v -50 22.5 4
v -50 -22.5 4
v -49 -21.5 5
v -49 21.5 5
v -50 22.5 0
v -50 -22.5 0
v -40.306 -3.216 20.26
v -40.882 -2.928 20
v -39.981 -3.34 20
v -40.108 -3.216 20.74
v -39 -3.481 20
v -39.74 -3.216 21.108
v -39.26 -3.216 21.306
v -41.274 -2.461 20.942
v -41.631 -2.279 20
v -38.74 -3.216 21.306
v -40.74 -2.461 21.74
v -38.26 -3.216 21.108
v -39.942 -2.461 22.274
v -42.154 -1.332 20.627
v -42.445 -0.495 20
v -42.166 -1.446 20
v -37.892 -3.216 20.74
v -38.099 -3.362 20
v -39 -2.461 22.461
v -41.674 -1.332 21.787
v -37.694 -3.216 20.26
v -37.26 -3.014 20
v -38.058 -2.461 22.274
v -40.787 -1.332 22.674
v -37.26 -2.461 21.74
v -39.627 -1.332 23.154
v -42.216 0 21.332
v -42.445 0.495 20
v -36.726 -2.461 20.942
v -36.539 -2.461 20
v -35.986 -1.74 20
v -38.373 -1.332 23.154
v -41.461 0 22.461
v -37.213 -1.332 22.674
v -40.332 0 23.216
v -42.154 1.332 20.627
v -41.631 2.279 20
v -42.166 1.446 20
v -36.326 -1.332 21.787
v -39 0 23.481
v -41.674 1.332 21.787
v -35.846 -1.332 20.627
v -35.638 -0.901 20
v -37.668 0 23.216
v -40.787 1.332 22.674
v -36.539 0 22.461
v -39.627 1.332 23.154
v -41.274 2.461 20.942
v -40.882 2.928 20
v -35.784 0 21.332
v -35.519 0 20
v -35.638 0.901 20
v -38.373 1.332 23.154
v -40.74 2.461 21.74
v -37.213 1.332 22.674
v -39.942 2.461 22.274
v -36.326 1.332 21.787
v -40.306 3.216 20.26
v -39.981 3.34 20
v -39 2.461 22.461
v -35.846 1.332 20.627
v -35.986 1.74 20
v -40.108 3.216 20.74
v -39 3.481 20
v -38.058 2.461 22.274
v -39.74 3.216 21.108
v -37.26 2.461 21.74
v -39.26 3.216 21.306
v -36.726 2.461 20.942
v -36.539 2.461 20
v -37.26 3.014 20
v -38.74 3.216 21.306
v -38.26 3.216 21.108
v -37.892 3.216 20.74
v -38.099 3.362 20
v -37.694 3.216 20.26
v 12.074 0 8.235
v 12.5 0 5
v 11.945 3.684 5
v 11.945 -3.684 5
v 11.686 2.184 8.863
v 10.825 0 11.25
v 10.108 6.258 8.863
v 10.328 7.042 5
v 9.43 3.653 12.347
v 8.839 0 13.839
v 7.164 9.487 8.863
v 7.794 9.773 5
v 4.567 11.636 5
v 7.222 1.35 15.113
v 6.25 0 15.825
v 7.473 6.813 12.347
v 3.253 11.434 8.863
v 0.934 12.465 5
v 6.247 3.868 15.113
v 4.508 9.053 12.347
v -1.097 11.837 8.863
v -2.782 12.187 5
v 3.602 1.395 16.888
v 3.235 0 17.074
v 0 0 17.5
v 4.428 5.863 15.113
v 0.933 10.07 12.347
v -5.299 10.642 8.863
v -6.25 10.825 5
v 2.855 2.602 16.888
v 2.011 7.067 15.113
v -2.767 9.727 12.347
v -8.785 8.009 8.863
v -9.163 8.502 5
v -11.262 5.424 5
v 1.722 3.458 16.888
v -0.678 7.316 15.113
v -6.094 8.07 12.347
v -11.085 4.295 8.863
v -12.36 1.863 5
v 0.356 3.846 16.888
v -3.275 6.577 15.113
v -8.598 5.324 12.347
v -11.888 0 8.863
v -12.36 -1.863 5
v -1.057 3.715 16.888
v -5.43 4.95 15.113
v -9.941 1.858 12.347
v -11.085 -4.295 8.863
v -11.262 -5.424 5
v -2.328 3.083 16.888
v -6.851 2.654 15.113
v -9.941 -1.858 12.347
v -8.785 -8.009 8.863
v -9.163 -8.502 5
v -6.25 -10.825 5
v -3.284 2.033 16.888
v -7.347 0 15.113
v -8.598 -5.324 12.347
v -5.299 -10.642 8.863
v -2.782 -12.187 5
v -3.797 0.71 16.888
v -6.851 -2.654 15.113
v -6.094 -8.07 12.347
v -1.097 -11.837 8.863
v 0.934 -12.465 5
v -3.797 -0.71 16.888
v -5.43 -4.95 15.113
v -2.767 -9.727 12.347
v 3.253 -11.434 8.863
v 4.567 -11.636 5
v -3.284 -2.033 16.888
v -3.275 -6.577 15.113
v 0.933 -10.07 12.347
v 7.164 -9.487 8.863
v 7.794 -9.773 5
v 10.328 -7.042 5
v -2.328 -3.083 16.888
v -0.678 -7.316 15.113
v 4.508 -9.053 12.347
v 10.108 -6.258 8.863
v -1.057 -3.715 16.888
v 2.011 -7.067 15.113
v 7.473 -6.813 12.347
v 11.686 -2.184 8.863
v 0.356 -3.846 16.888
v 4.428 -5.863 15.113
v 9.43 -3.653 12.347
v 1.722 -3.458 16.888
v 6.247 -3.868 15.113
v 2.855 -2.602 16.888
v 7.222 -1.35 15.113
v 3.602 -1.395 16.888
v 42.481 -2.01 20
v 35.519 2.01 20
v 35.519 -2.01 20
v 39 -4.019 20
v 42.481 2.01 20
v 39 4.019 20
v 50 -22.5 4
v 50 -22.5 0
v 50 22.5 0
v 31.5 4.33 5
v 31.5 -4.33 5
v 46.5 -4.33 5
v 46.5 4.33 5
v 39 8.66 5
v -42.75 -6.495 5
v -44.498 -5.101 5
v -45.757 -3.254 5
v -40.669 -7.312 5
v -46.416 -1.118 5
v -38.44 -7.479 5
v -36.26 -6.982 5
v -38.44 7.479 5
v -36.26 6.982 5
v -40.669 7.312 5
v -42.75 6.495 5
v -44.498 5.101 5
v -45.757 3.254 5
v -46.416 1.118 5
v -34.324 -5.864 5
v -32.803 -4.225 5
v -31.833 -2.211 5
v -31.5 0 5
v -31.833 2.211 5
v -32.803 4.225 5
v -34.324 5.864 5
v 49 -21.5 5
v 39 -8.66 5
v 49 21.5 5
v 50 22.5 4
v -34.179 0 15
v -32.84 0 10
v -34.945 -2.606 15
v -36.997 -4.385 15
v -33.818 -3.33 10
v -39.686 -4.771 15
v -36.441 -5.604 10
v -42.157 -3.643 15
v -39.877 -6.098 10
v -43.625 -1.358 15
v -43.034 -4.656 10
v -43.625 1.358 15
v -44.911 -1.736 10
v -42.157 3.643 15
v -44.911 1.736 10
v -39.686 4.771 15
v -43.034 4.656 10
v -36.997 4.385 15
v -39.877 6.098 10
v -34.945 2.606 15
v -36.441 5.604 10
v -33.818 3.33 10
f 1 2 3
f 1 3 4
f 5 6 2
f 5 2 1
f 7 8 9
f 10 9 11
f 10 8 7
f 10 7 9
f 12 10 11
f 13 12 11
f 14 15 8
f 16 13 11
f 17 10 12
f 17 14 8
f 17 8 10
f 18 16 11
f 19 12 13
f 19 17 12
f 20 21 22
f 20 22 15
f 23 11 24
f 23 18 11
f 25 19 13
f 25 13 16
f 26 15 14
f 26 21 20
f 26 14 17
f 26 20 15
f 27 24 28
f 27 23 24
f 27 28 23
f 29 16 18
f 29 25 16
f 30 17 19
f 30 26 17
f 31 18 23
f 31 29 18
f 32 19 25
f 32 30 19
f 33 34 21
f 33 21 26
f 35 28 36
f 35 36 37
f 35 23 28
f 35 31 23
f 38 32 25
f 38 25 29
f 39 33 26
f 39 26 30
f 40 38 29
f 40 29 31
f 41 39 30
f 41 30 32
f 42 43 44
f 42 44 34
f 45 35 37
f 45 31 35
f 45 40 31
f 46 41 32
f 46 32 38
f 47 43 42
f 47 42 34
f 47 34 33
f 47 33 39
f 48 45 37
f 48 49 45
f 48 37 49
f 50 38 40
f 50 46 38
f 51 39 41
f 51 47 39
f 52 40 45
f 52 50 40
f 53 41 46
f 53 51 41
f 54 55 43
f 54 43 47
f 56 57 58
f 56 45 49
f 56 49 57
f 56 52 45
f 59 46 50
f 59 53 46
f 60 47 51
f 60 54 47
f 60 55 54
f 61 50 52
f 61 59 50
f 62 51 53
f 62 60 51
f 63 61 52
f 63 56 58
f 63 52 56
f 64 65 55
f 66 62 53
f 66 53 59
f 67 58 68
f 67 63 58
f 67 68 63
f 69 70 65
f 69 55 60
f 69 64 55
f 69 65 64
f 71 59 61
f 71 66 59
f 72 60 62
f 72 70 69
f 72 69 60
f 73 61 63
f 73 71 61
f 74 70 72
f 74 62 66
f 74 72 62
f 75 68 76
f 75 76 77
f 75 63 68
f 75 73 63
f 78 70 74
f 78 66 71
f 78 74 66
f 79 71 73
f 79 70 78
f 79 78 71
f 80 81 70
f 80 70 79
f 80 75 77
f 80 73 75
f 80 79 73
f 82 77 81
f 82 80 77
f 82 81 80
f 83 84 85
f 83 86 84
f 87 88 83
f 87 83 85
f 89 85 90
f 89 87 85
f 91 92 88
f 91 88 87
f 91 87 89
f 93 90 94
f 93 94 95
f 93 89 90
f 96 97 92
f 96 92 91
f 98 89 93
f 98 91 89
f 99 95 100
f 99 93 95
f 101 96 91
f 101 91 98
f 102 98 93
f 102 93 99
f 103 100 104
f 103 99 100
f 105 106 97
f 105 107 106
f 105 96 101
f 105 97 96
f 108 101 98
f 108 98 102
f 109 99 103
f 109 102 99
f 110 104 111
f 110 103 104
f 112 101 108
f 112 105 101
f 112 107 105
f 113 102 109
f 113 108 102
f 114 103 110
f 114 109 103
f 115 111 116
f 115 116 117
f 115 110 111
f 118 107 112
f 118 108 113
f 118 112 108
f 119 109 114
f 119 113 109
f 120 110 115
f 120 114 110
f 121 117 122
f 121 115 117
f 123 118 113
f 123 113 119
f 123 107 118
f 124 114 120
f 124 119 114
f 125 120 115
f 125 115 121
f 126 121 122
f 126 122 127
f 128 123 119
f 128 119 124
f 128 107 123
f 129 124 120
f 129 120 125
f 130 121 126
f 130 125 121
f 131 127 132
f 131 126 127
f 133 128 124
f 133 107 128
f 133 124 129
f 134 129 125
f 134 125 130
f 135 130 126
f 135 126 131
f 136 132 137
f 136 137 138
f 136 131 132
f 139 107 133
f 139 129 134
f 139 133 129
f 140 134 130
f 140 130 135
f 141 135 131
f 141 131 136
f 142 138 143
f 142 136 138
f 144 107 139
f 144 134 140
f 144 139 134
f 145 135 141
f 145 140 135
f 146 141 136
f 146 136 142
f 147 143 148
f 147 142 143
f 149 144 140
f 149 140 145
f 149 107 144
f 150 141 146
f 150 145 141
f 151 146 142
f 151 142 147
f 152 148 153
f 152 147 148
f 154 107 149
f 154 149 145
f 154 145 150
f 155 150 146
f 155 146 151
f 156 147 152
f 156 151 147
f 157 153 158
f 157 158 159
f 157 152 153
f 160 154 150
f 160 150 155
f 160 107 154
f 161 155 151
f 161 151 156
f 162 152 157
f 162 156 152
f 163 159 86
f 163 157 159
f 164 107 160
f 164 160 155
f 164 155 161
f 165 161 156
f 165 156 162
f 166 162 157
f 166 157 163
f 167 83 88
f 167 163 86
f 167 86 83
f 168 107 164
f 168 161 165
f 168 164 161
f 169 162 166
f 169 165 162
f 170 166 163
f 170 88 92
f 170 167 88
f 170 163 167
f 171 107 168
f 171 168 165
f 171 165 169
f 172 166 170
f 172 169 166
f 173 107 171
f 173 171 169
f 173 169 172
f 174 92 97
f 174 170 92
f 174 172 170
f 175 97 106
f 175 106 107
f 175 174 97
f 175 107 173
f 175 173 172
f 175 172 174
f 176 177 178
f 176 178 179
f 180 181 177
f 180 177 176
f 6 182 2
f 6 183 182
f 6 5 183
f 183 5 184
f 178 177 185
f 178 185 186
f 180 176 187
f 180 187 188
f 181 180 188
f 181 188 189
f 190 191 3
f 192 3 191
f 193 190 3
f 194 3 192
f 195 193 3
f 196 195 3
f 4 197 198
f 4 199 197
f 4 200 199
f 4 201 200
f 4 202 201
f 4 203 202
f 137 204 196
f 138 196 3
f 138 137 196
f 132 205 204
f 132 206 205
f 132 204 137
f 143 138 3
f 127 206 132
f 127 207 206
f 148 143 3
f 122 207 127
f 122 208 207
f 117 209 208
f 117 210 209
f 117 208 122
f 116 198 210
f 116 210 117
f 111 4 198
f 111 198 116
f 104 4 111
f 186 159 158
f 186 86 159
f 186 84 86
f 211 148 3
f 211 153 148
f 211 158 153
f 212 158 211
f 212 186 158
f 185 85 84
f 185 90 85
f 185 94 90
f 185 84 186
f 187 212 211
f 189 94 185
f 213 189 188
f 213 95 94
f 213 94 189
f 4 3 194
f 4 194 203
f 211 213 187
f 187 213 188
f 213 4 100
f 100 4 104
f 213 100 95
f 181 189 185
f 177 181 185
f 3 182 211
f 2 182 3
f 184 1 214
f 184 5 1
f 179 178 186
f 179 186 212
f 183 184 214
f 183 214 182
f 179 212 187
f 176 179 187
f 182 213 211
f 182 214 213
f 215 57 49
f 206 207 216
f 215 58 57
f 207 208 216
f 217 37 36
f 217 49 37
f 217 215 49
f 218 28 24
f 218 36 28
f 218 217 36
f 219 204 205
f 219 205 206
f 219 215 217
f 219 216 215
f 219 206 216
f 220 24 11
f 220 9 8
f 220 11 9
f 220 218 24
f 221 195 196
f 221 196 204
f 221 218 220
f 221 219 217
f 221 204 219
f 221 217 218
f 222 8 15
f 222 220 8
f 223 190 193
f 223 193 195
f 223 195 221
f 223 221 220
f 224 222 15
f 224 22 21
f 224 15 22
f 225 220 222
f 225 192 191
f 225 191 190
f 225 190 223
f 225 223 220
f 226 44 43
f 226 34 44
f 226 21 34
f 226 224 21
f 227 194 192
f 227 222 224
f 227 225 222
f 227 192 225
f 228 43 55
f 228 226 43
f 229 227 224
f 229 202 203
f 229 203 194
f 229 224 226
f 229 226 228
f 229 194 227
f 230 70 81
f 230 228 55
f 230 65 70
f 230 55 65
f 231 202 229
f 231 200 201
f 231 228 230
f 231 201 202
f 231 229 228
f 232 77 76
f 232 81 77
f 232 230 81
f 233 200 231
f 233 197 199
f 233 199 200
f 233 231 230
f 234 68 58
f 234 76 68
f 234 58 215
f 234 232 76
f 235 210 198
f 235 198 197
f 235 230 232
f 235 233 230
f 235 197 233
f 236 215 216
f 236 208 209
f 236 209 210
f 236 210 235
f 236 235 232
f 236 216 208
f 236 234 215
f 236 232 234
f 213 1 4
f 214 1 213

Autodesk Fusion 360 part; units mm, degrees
sketch "Sketch1" plane through (0, 0, 0) normal (0, 0, 1) x (1, 0, 0)
  line L0 (-50, 22.5) -> (50, 22.5)
  line L1 (50, 22.5) -> (50, -22.5)
  line L2 (50, -22.5) -> (-50, -22.5)
  line L3 (-50, -22.5) -> (-50, 22.5)
  line L4 (-50, 22.5) -> (50, -22.5) construction
  dimension "d1" = 100
  dimension "d2" = 45
extrude "Extrude1" add sketch "Sketch1" along normal blind 5
sphere "SpherePrimitive1" add diameter 25 placed x (1, 0, 0) y (0, 1, 0) z (0, 0, 1) at (0, 0, 5)
box "BoxPrimitive1" cut length 45 width 100 height 15 placed x (0, 1, 0) y (1, 0, 0) z (0, 0, -1) at (-50, -22.5, 0)
sketch "Sketch5" plane through (0, 0, 5) normal (0, 0, 1) x (1, 0, 0)
  circle A0 centre (0, 0) radius 12.5
  line L0 (-50, -22.5) -> (50, -22.5)
  line L1 (50, -22.5) -> (50, 22.5)
  line L2 (50, 22.5) -> (-50, 22.5)
  line L3 (-50, 22.5) -> (-50, -22.5)
  line L4 (39, -8.6603) -> (46.5, -4.3301)
  line L5 (46.5, -4.3301) -> (46.5, 4.3301)
  line L6 (46.5, 4.3301) -> (39, 8.6603)
  line L7 (39, 8.6603) -> (31.5, 4.3301)
  line L8 (31.5, 4.3301) -> (31.5, -4.3301)
  line L9 (31.5, -4.3301) -> (39, -8.6603)
  line L10 (12.5, 0) -> (31.5, 0) construction
  line L11 (0, 0) -> (50, 0) construction
  line L12 (-12.5, 0) -> (-31.5, 0) construction
  circle A1 centre (-39, 0) radius 7.5
  point P0 (39, 0)
  dimension "d16" = 19
  dimension "d17" = 15
  dimension "d18" = 19
  dimension "d19" = 15
extrude "Extrude3" add sketch "Sketch5" along normal blind 15 draft -15 contours L4 L5 L6 L7 L8 L9 | A1
sketch "Sketch9" plane through (0, 0, 20) normal (0, 0, 1) x (1, 0, 0)
  circle A0 centre (-39, 0) radius 3.4808
  line L0 (-39, 3.4808) -> (-39, -3.4808)
  point P0 (-39, 0)
revolve "Revolve1" add sketch "Sketch9" angle 180 about axis through (-39, 3.4808, 20) along (0, -1, 0) contours A0 L0 picked at (-38.2402, 0.8769)
chamfer "Chamfer1" distance 1 angle 45 4 edges at (0, -22.5, 5) (50, 0, 5) (0, 22.5, 5) (-50, 0, 5)
